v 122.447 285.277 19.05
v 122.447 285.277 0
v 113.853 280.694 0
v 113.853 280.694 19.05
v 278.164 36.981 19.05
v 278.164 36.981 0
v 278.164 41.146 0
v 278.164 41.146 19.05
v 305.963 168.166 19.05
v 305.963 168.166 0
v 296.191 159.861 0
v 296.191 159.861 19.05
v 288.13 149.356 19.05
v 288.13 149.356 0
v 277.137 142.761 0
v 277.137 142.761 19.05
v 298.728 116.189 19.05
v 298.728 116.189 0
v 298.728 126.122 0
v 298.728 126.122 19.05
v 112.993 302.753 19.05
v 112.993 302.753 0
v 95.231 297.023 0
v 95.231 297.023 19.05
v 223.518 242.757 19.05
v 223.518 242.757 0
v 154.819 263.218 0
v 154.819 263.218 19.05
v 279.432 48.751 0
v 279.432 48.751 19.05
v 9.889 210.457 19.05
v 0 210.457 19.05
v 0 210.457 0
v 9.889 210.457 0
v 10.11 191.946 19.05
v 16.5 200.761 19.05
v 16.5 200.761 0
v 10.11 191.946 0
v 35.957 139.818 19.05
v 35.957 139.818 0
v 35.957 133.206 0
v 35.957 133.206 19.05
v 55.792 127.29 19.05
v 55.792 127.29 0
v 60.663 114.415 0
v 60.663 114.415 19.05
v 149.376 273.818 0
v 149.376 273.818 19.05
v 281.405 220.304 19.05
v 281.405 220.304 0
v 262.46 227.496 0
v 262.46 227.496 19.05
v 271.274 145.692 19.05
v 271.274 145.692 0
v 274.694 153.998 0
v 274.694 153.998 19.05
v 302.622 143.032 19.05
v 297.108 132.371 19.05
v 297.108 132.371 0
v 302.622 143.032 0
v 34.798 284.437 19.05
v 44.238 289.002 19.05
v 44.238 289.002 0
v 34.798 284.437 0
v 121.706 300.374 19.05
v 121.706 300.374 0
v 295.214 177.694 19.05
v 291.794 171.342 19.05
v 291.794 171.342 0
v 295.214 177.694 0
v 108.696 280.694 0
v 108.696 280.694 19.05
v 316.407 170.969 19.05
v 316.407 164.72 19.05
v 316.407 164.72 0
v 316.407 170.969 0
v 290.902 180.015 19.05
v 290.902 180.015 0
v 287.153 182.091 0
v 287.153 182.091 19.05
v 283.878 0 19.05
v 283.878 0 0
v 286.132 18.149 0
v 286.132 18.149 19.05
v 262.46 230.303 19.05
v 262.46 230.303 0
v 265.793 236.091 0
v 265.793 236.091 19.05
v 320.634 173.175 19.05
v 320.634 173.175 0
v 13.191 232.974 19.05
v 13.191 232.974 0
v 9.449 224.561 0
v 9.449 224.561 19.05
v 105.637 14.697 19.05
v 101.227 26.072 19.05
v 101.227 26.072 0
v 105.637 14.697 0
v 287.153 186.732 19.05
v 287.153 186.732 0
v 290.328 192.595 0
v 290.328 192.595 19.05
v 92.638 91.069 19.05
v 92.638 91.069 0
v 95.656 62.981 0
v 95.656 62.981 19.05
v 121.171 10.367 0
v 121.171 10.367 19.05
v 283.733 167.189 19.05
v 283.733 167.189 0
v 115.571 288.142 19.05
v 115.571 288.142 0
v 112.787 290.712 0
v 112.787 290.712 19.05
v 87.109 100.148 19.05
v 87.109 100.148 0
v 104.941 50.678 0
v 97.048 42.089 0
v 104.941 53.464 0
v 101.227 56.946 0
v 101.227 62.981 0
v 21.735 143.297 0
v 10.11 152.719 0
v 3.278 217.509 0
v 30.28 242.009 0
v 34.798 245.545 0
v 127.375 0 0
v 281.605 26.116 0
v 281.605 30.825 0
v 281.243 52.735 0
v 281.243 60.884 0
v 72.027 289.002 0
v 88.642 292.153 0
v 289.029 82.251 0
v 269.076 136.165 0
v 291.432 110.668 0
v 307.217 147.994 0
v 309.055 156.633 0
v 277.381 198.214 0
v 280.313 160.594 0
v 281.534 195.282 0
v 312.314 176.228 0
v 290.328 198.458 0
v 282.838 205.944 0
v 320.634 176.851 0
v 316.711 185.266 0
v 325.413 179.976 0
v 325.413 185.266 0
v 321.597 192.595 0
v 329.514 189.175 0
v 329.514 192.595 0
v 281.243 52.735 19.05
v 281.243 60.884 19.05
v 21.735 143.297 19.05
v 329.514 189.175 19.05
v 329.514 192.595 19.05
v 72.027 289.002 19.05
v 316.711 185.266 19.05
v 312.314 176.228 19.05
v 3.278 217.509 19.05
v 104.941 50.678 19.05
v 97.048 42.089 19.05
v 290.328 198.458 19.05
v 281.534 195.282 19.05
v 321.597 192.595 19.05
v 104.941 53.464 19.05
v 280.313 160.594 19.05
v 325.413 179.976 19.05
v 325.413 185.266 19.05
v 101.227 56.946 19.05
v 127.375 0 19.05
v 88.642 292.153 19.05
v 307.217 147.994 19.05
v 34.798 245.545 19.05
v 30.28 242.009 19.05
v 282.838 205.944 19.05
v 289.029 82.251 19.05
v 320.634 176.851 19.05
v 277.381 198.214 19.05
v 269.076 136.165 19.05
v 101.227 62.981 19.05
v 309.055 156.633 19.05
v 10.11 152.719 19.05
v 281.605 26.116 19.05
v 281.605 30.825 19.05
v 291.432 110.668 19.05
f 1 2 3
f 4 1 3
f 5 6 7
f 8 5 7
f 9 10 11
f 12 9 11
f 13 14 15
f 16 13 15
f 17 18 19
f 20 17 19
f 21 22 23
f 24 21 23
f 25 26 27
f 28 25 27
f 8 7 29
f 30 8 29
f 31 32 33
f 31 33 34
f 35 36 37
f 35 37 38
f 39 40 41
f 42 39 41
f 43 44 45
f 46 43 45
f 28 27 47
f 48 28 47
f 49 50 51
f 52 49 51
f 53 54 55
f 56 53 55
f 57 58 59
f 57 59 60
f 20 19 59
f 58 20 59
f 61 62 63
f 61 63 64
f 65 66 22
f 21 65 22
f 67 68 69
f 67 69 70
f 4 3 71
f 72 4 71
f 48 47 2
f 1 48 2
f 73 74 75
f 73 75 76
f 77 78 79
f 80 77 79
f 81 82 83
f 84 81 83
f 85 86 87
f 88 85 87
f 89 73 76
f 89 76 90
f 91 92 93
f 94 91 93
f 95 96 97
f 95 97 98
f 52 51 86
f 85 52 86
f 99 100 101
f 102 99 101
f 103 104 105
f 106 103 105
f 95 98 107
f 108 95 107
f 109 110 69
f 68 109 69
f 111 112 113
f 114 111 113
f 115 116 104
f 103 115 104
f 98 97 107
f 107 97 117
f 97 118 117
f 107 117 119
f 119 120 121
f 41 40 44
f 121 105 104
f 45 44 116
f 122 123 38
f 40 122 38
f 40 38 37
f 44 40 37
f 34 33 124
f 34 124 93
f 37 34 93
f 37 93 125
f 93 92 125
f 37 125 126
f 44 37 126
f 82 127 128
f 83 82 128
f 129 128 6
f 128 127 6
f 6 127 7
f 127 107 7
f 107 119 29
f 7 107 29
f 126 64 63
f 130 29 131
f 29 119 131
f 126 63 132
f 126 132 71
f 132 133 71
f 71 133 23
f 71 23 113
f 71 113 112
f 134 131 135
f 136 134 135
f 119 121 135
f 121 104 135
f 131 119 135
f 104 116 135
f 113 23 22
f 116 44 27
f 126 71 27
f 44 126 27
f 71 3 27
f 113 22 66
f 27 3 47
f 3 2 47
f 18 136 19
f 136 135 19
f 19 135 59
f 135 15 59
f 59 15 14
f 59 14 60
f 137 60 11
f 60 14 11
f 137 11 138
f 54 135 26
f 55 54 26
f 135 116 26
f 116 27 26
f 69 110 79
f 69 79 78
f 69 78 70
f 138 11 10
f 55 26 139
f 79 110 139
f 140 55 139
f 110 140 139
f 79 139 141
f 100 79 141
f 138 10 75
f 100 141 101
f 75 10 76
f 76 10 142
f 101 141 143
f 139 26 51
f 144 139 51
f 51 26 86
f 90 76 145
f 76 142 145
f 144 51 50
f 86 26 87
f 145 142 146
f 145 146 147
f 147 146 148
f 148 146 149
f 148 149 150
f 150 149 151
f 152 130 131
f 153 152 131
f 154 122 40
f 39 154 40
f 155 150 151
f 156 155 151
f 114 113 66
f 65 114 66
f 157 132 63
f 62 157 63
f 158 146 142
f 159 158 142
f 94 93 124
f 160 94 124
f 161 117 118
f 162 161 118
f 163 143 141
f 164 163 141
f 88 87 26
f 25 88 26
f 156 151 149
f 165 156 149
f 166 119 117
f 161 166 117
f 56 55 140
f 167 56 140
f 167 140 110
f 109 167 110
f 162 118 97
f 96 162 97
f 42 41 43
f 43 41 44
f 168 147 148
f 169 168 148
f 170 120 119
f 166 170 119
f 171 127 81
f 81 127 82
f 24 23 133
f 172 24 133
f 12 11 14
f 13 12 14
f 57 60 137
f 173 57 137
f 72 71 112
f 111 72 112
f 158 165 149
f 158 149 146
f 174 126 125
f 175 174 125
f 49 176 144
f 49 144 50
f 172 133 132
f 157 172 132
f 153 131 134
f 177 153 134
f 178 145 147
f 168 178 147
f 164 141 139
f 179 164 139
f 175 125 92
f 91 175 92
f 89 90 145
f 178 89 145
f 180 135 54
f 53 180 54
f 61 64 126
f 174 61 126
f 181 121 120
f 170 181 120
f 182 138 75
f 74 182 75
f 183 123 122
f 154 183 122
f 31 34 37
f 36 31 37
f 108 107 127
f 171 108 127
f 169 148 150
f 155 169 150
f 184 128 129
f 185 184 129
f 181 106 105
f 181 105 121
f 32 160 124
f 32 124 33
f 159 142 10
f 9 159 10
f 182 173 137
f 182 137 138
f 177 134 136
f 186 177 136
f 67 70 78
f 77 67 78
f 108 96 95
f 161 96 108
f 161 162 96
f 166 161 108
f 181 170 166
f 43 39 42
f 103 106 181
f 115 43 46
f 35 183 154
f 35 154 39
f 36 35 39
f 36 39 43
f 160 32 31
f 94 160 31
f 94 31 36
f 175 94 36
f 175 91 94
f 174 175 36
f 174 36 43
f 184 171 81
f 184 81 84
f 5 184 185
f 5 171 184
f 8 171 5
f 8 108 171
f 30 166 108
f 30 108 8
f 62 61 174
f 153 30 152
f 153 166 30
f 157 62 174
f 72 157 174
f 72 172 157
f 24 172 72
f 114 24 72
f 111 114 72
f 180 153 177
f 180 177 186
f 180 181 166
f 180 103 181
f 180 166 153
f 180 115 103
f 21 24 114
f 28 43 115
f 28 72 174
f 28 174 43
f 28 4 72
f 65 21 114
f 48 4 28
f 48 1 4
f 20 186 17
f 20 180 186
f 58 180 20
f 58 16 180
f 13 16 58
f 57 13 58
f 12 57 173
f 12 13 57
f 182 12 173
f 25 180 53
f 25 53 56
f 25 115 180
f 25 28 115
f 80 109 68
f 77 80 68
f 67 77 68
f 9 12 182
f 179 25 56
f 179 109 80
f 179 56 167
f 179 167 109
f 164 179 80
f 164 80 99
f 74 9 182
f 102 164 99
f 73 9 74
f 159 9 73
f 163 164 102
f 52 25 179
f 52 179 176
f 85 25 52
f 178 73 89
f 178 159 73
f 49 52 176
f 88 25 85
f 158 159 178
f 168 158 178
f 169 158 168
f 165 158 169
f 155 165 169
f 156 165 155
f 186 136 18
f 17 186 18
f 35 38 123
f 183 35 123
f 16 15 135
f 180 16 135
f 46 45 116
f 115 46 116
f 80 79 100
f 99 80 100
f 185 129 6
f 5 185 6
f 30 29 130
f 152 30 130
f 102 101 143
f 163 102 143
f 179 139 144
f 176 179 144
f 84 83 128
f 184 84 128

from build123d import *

# Parameters (mm, degrees)
F1_DEPTH = 19.05


with BuildPart() as f1:
    # F0 (on Top) → F1 (new body)
    with BuildSketch(Plane.XY):
        Polygon((127.374873, 0), (130.079165, 0), (283.87782, 0), (286.131769, 18.14894), (281.604767, 26.116442), (281.604767, 30.82451), (278.164268, 36.981218), (278.164268, 41.146047), (279.43182, 48.751391), (281.242609, 52.735142), (281.242609, 60.883723), (289.029032, 82.251117), (291.432261, 110.667914), (298.728049, 116.189055), (298.728049, 126.121819), (297.107786, 132.371083), (302.621841, 143.031597), (307.216913, 147.99425), (309.054911, 156.63293), (316.406995, 164.720222), (316.406995, 170.969486), (320.634454, 173.175111), (320.634454, 176.851138), (325.413287, 179.975778), (325.413287, 185.26645), (329.513514, 189.175025), (329.513514, 192.59502), (321.59701, 192.59502), (316.711307, 185.26645), (312.314153, 176.227897), (305.962741, 168.166474), (296.191305, 159.86076), (288.129896, 149.356484), (277.137041, 142.760769), (269.075632, 136.165068), (271.274179, 145.692199), (274.694204, 153.997913), (280.312747, 160.593614), (283.732742, 167.18933), (291.794181, 171.342179), (295.214176, 177.693605), (290.902208, 180.015432), (287.152767, 182.090744), (287.152767, 186.732173), (290.328473, 192.59502), (290.328473, 198.457882), (281.534195, 195.282161), (277.381331, 198.213592), (282.837977, 205.943848), (281.40533, 220.303819), (262.460262, 227.495939), (262.460262, 230.302602), (265.793204, 236.091375), (223.517641, 242.757231), (154.819116, 263.218462), (149.376005, 273.818195), (122.446977, 285.277367), (113.852613, 280.69371), (108.695991, 280.69371), (115.571484, 288.142145), (112.78723, 290.71223), (121.705609, 300.373787), (112.993173, 302.752584), (95.231473, 297.022998), (88.642456, 292.152852), (72.02667, 289.001584), (44.238199, 289.001584), (34.797754, 284.43718), (34.797754, 245.544836), (30.27996, 242.009178), (13.190903, 232.973576), (9.448506, 224.560991), (3.278016, 217.509001), (0, 210.457027), (9.889254, 210.457027), (16.500488, 200.760543), (10.109629, 191.945568), (10.109629, 152.718902), (21.735432, 143.29727), (35.956949, 139.817506), (35.956949, 133.20598), (55.791546, 127.290398), (60.663197, 114.41531), (87.10932, 100.14832), (92.637829, 91.069408), (95.655568, 62.981203), (101.226784, 62.981203), (101.226784, 56.945719), (104.940929, 53.463712), (104.940929, 50.678104), (97.048372, 42.089149), (101.226784, 26.071908), (105.637327, 14.697347), (121.170625, 10.366562), align=None)
    extrude(amount=F1_DEPTH)


solid = f1.part
